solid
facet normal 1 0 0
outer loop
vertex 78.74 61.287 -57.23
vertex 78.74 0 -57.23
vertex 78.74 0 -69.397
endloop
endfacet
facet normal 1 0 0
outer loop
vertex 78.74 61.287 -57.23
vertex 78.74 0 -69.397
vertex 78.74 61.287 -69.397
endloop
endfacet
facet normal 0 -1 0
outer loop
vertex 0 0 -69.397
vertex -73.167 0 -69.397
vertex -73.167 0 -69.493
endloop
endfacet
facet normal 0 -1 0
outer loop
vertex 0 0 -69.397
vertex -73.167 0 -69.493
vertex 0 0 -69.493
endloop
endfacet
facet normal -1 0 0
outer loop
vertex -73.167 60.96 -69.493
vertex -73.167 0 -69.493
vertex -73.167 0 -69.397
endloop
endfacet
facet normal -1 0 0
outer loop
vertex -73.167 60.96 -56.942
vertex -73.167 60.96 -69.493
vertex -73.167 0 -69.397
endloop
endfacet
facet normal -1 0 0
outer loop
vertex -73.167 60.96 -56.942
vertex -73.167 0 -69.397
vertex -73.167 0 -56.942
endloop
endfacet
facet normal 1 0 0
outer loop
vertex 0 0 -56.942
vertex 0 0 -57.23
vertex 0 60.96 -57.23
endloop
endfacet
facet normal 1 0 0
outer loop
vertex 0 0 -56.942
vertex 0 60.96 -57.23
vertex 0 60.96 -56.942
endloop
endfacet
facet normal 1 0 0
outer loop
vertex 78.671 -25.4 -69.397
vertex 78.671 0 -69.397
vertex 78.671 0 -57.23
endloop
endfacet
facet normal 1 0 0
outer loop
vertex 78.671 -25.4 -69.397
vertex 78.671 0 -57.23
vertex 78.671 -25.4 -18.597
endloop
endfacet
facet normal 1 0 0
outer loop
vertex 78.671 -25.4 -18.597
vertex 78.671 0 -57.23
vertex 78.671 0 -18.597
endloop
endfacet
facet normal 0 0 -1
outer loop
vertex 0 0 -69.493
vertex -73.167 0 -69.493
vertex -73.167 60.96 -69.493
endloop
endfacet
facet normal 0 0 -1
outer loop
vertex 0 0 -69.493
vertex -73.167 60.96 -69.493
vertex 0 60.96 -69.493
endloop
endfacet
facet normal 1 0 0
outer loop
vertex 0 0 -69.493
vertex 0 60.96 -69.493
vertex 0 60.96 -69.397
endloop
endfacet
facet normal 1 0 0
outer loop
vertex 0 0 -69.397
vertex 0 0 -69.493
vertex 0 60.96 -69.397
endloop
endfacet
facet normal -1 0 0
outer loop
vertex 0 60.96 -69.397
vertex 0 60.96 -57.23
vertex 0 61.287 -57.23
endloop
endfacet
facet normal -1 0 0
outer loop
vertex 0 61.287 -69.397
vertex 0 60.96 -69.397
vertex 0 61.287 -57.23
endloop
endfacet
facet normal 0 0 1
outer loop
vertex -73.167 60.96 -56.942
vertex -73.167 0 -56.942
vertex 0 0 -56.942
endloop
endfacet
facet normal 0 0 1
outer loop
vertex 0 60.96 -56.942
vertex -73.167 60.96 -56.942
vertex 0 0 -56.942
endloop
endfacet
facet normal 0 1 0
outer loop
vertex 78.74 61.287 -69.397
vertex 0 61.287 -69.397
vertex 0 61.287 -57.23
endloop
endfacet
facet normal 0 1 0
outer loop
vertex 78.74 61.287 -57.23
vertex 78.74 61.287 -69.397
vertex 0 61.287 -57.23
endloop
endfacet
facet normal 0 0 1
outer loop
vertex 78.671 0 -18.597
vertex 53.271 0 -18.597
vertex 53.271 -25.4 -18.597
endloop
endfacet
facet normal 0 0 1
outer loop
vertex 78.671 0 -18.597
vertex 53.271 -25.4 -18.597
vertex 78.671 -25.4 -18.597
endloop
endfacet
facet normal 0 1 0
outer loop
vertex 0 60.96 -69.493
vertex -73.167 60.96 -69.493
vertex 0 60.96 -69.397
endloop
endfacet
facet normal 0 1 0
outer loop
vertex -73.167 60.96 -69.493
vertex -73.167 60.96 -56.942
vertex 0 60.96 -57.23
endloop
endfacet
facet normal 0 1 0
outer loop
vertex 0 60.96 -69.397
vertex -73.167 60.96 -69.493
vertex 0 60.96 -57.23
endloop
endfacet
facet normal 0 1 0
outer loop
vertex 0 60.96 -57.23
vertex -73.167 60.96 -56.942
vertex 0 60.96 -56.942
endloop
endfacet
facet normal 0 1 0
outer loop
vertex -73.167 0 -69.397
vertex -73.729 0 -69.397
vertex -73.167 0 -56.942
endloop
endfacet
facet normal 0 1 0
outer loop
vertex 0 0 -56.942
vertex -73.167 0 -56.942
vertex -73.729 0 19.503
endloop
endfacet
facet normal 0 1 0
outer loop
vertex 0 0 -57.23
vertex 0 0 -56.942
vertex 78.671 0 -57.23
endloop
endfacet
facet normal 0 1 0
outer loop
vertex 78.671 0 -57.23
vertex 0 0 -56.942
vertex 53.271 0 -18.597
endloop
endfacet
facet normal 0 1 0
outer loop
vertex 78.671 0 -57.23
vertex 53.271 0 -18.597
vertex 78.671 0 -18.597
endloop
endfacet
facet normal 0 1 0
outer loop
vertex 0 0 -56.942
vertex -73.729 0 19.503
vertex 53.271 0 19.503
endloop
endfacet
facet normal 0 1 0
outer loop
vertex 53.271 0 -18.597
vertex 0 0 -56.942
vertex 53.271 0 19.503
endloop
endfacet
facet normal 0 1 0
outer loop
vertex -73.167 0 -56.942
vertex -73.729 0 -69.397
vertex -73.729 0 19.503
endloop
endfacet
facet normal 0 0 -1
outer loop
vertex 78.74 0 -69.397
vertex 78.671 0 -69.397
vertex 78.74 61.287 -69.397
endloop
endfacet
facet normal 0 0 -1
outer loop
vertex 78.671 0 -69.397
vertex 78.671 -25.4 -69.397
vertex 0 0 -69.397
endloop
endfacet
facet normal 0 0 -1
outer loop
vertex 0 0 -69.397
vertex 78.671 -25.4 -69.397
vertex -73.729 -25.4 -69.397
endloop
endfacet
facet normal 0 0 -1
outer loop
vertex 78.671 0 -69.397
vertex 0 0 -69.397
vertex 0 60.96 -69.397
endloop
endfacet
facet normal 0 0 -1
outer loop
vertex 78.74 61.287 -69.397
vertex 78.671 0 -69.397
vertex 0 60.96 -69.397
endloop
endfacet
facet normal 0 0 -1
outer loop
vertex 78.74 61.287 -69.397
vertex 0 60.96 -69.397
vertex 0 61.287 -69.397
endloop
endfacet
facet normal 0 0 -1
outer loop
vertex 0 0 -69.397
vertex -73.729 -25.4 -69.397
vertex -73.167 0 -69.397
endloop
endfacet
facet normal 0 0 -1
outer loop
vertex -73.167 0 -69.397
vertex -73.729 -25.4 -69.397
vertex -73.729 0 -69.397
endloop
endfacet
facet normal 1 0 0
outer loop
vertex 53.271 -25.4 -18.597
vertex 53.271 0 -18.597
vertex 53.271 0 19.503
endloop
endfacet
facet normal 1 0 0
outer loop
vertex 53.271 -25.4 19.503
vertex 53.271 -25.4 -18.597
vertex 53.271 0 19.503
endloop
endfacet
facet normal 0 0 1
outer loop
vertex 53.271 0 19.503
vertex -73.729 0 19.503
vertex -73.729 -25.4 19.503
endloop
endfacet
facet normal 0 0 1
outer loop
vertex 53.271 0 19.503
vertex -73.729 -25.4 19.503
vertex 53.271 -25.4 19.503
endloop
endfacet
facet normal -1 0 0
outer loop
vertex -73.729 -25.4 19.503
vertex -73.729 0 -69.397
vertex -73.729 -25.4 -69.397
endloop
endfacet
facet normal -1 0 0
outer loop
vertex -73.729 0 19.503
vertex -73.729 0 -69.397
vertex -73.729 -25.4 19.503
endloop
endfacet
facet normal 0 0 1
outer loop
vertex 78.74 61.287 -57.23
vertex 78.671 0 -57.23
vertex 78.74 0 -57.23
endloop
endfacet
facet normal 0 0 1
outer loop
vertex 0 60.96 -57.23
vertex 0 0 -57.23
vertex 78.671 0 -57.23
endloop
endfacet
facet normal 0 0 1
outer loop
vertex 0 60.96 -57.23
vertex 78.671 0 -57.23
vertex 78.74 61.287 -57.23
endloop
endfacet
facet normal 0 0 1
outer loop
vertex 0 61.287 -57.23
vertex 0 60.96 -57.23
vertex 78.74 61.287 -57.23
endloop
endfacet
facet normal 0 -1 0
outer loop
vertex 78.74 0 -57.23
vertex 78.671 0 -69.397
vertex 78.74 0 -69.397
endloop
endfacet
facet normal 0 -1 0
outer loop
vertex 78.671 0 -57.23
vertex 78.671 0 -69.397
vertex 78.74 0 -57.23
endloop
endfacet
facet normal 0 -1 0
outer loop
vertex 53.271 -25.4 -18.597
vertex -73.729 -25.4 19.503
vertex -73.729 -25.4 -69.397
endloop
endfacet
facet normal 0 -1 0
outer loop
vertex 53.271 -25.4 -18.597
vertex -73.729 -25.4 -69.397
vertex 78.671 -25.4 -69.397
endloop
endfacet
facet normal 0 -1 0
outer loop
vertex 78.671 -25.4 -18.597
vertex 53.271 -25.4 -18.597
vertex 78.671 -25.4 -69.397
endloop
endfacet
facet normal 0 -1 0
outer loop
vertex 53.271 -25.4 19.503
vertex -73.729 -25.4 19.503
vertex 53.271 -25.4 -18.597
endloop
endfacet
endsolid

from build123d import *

# Parameters (mm, degrees)
F0_W     = 152.4
F0_H     = 50.8
F2_DEPTH = 25.4
F1_W     = 127
F1_H     = 38.1
F3_DEPTH = 25.4
F4_W     = 61.2871721387
F4_H     = 12.1671258756
F5_DEPTH = 78.74
F6_W     = 73.1669291854
F6_H     = 12.5516466796
F7_DEPTH = 60.96


with BuildPart() as f2:
    # F0 (on Front) → F2 (new body)
    with BuildSketch(Plane.XZ):
        with Locations((2.4711750448, -43.9968049534)):
            Rectangle(F0_W, F0_H)
    extrude(amount=F2_DEPTH)

    # F1 (on Front) → F3 (join)
    with BuildSketch(Plane.XZ):
        with Locations((-10.2288249552, 0.4531950466)):
            Rectangle(F1_W, F1_H)
    extrude(amount=F3_DEPTH)

    # F4 (on Right) → F5 (join)
    with BuildSketch(Plane.YZ):
        with Locations((30.6435860693, -63.3132420157)):
            Rectangle(F4_W, F4_H)
    extrude(amount=F5_DEPTH)

    # F6 (on Front) → F7 (join)
    with BuildSketch(Plane.XZ):
        with Locations((-36.5834645927, -63.2174480706)):
            Rectangle(F6_W, F6_H)
    extrude(amount=-F7_DEPTH)


solid = f2.part
